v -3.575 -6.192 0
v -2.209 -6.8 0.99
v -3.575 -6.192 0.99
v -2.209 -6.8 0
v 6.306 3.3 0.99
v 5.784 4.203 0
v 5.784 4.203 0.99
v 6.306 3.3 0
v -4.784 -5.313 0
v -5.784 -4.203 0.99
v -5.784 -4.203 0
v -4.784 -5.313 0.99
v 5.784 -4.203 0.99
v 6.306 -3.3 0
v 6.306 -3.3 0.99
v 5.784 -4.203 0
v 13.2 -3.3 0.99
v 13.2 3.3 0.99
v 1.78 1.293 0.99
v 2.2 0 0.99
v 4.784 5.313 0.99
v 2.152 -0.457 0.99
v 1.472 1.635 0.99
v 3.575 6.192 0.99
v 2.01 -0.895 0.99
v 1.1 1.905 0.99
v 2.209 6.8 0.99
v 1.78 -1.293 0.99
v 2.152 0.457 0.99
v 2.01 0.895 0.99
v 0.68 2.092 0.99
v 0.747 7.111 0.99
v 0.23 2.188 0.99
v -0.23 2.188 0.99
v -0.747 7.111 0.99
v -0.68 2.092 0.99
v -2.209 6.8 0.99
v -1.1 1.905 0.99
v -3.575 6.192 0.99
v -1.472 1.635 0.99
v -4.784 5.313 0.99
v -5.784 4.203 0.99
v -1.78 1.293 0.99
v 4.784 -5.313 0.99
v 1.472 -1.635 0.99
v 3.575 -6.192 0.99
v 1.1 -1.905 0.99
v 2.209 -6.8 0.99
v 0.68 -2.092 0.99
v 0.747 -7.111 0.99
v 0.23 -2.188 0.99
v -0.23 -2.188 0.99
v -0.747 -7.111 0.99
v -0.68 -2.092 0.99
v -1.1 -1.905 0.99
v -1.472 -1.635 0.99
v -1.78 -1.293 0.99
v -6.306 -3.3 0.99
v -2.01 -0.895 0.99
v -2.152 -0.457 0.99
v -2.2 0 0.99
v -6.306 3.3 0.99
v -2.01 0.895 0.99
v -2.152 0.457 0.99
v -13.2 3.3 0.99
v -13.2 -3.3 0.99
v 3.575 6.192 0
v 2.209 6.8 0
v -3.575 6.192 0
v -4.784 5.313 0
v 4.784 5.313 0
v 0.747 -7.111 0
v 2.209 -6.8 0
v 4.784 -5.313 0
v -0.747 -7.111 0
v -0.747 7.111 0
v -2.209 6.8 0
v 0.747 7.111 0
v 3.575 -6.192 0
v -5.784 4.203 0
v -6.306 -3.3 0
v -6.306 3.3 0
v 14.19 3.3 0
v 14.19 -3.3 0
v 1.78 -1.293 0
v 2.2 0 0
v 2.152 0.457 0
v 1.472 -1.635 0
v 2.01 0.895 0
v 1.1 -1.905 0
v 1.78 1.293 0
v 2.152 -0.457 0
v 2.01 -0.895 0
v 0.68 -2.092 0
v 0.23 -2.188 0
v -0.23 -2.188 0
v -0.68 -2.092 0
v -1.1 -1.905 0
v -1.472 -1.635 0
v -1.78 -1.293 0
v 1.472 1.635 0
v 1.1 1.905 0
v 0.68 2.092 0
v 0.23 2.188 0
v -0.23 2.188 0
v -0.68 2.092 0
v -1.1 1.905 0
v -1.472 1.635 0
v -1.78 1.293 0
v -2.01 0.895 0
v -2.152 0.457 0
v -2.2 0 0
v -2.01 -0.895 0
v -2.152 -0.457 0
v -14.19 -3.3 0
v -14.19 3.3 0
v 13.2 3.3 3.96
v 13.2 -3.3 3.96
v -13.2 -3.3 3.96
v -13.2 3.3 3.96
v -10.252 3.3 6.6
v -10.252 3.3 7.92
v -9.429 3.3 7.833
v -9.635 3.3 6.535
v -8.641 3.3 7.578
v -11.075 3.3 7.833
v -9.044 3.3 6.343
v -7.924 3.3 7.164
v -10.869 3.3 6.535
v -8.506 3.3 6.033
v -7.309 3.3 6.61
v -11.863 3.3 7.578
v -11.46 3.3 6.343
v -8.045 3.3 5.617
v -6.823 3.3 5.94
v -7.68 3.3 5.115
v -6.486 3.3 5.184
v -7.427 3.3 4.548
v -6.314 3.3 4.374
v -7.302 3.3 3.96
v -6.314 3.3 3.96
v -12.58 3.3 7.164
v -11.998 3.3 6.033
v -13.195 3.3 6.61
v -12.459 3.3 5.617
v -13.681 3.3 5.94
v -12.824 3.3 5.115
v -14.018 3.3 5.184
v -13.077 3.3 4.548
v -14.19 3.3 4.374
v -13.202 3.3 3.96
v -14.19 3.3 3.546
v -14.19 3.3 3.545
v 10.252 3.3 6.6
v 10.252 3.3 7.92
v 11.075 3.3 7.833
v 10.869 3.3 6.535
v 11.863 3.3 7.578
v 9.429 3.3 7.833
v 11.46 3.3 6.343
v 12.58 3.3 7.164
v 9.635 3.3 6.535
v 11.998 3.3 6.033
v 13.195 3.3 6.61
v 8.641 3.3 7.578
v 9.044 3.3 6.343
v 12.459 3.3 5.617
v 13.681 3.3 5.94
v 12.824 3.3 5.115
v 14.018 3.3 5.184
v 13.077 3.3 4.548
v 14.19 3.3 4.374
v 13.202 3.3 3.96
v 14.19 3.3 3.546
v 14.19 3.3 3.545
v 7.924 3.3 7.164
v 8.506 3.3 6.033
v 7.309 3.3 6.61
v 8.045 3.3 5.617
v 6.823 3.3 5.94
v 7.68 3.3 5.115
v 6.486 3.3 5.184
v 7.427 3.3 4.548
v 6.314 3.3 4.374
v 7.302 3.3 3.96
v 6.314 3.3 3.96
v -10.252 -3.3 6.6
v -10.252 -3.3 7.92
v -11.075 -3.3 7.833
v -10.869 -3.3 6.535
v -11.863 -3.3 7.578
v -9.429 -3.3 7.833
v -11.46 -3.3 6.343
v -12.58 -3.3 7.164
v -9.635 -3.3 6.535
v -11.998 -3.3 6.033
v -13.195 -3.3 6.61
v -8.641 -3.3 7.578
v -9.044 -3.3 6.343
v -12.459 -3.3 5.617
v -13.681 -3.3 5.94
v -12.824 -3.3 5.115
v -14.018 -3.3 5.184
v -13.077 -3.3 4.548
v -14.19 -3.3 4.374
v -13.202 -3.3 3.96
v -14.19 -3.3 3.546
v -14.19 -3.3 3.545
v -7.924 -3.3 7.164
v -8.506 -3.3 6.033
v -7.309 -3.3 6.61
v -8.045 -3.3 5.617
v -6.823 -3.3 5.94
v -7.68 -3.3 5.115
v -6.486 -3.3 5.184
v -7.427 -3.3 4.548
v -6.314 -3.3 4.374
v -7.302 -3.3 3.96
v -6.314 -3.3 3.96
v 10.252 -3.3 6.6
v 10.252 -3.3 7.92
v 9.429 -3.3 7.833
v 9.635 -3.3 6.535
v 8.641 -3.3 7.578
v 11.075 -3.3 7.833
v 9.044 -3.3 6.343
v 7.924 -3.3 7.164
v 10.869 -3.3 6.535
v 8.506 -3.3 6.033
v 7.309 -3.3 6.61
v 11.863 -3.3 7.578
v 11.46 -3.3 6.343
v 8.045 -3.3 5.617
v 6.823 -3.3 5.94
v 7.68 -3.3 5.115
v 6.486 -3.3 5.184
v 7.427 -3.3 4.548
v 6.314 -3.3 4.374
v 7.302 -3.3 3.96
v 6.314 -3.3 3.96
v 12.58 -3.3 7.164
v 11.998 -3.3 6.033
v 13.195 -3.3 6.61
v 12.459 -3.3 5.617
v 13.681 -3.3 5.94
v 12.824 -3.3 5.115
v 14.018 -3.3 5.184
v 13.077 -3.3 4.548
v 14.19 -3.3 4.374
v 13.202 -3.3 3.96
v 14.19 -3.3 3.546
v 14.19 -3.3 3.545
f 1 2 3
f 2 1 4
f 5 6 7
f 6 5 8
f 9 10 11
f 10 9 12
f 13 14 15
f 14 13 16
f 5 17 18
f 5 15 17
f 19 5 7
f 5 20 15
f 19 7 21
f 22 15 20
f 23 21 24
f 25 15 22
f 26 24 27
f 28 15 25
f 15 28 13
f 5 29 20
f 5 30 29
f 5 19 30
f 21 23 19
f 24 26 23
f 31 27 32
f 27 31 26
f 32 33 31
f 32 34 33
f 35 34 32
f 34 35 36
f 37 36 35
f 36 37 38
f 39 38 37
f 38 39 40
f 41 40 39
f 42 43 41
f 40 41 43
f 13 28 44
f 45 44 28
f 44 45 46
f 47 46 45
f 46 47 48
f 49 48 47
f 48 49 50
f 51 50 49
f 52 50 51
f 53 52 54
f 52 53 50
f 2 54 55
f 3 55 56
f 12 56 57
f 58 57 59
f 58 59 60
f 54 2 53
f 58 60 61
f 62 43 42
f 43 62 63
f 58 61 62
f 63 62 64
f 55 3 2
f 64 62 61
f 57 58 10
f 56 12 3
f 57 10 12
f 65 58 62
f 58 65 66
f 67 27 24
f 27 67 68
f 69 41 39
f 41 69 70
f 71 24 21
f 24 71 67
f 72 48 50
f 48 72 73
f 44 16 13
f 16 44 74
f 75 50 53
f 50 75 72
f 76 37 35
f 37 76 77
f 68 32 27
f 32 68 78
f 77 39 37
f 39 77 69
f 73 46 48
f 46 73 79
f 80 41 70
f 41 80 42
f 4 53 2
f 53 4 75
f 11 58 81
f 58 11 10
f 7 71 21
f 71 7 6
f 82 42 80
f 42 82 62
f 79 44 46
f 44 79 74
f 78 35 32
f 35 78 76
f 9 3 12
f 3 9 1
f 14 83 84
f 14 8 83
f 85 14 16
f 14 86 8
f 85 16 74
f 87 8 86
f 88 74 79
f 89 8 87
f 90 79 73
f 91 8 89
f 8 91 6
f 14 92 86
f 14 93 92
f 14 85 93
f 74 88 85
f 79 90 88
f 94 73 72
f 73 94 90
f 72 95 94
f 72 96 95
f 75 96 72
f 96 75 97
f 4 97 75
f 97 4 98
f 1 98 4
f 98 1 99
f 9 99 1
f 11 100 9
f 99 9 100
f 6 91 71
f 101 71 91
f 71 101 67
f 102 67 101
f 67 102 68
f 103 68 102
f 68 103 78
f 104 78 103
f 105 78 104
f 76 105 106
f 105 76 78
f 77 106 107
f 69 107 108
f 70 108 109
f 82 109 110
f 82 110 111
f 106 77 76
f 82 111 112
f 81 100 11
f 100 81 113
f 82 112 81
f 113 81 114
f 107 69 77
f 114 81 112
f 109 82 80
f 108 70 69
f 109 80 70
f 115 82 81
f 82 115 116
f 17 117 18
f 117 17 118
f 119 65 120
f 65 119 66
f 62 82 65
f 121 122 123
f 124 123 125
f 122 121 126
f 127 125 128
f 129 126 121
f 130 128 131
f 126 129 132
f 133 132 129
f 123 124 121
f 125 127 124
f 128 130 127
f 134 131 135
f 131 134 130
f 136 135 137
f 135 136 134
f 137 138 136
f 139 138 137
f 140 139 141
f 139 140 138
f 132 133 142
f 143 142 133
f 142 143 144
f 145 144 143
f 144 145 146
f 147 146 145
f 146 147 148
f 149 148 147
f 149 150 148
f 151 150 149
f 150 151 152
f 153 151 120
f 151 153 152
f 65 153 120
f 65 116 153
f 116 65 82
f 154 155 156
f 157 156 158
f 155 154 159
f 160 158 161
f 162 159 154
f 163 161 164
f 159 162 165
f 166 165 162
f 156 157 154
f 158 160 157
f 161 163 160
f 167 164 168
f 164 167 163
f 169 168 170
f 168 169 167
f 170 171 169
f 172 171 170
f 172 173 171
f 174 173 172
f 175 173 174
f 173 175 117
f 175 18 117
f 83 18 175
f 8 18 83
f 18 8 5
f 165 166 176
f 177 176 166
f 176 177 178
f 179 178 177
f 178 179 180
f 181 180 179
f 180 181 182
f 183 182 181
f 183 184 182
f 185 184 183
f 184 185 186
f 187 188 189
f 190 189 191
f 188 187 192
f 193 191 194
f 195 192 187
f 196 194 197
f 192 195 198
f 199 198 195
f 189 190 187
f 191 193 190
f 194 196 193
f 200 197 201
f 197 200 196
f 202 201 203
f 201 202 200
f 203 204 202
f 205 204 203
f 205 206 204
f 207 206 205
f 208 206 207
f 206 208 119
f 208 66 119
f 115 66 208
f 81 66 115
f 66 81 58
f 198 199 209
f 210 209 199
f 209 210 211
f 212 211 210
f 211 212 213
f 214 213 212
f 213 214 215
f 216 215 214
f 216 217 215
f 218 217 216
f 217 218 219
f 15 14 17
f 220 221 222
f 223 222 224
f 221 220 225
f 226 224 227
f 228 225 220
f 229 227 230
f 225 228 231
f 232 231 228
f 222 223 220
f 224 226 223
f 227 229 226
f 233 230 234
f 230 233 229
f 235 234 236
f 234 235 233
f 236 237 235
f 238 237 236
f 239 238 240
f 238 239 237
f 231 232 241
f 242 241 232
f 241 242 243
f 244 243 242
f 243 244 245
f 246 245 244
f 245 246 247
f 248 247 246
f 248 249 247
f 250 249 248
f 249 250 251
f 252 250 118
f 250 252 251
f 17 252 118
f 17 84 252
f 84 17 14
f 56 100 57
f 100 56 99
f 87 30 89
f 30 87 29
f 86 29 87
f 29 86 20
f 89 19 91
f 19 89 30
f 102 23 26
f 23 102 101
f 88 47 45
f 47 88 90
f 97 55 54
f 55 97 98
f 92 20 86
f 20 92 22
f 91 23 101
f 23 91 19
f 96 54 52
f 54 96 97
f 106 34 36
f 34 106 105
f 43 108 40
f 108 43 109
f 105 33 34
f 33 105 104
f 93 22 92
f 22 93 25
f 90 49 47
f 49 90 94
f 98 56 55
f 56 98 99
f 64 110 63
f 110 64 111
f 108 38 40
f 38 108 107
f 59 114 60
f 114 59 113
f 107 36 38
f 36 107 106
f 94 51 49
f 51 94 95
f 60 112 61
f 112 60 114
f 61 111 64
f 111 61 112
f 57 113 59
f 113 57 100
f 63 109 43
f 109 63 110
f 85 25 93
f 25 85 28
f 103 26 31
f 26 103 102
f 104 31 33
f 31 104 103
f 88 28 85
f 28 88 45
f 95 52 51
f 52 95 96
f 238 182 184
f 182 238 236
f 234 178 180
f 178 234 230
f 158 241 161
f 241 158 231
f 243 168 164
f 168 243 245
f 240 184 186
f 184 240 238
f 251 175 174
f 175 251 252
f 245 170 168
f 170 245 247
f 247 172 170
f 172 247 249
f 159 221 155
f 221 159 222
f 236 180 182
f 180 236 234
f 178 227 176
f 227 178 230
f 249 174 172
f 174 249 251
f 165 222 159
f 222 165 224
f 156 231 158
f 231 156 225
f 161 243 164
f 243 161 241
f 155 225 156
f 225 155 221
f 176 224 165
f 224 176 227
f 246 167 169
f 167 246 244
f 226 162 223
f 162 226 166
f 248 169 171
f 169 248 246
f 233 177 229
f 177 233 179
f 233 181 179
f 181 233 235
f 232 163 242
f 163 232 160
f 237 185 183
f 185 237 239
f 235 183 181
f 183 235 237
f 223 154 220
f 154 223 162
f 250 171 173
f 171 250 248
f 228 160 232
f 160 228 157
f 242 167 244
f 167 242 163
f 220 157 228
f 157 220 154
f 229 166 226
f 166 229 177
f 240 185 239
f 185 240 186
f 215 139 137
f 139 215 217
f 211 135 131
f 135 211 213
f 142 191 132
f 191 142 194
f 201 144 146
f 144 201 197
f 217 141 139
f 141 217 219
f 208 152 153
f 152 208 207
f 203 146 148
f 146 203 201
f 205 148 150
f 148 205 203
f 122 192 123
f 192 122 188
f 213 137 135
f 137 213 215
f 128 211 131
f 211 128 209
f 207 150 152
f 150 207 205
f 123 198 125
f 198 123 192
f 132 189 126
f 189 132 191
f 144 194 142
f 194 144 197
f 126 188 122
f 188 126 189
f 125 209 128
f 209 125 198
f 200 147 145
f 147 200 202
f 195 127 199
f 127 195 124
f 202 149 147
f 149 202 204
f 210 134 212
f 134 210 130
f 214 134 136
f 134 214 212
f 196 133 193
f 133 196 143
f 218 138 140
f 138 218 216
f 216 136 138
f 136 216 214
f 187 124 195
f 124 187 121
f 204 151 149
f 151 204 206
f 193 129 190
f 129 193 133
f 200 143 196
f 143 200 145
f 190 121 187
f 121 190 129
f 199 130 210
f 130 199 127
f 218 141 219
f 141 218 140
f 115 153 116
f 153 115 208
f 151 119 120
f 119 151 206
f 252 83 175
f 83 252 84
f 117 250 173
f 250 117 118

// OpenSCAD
$fs = 0.01;
scale(0.55){
difference(){
    union() {
        cylinder(01.8, 13, 13);    
        translate([-24, -6, 0]){cube([48,12,1.8]);};
    };
    cylinder(1.8, 4, 4);
};
//translate([18, -30, 4]){rotate([0, 90, 90]){cylinder(60, 4, 4);};};
//translate([-18, -30, 4]){rotate([0, 90, 90]){cylinder(60, 4, 4);};};
mirror([1,0,0]) {
    translate([24,-6,0]){cube([1.8,12,7.2]);};
    difference(){
        translate([18.64, -6, 7.2]){rotate([0, 90, 90]){cylinder(12, 7.2, 7.2 );};};
        translate([18.64, -6, 6.6]){rotate([0, 90, 90]){cylinder(12, 5.4, 5.4 );};};
        translate([11,-6,0]){cube([13,12,7.2]);};
    };
};
translate([24,-6,0]){cube([1.8,12,7.2]);};
difference(){
    translate([18.64, -6, 7.2]){rotate([0, 90, 90]){cylinder(12, 7.2, 7.2 );};};
    translate([18.64, -6, 6.6]){rotate([0, 90, 90]){cylinder(12, 5.4, 5.4 );};};
    translate([11,-6,0]){cube([13,12,7.2]);};
};
};
